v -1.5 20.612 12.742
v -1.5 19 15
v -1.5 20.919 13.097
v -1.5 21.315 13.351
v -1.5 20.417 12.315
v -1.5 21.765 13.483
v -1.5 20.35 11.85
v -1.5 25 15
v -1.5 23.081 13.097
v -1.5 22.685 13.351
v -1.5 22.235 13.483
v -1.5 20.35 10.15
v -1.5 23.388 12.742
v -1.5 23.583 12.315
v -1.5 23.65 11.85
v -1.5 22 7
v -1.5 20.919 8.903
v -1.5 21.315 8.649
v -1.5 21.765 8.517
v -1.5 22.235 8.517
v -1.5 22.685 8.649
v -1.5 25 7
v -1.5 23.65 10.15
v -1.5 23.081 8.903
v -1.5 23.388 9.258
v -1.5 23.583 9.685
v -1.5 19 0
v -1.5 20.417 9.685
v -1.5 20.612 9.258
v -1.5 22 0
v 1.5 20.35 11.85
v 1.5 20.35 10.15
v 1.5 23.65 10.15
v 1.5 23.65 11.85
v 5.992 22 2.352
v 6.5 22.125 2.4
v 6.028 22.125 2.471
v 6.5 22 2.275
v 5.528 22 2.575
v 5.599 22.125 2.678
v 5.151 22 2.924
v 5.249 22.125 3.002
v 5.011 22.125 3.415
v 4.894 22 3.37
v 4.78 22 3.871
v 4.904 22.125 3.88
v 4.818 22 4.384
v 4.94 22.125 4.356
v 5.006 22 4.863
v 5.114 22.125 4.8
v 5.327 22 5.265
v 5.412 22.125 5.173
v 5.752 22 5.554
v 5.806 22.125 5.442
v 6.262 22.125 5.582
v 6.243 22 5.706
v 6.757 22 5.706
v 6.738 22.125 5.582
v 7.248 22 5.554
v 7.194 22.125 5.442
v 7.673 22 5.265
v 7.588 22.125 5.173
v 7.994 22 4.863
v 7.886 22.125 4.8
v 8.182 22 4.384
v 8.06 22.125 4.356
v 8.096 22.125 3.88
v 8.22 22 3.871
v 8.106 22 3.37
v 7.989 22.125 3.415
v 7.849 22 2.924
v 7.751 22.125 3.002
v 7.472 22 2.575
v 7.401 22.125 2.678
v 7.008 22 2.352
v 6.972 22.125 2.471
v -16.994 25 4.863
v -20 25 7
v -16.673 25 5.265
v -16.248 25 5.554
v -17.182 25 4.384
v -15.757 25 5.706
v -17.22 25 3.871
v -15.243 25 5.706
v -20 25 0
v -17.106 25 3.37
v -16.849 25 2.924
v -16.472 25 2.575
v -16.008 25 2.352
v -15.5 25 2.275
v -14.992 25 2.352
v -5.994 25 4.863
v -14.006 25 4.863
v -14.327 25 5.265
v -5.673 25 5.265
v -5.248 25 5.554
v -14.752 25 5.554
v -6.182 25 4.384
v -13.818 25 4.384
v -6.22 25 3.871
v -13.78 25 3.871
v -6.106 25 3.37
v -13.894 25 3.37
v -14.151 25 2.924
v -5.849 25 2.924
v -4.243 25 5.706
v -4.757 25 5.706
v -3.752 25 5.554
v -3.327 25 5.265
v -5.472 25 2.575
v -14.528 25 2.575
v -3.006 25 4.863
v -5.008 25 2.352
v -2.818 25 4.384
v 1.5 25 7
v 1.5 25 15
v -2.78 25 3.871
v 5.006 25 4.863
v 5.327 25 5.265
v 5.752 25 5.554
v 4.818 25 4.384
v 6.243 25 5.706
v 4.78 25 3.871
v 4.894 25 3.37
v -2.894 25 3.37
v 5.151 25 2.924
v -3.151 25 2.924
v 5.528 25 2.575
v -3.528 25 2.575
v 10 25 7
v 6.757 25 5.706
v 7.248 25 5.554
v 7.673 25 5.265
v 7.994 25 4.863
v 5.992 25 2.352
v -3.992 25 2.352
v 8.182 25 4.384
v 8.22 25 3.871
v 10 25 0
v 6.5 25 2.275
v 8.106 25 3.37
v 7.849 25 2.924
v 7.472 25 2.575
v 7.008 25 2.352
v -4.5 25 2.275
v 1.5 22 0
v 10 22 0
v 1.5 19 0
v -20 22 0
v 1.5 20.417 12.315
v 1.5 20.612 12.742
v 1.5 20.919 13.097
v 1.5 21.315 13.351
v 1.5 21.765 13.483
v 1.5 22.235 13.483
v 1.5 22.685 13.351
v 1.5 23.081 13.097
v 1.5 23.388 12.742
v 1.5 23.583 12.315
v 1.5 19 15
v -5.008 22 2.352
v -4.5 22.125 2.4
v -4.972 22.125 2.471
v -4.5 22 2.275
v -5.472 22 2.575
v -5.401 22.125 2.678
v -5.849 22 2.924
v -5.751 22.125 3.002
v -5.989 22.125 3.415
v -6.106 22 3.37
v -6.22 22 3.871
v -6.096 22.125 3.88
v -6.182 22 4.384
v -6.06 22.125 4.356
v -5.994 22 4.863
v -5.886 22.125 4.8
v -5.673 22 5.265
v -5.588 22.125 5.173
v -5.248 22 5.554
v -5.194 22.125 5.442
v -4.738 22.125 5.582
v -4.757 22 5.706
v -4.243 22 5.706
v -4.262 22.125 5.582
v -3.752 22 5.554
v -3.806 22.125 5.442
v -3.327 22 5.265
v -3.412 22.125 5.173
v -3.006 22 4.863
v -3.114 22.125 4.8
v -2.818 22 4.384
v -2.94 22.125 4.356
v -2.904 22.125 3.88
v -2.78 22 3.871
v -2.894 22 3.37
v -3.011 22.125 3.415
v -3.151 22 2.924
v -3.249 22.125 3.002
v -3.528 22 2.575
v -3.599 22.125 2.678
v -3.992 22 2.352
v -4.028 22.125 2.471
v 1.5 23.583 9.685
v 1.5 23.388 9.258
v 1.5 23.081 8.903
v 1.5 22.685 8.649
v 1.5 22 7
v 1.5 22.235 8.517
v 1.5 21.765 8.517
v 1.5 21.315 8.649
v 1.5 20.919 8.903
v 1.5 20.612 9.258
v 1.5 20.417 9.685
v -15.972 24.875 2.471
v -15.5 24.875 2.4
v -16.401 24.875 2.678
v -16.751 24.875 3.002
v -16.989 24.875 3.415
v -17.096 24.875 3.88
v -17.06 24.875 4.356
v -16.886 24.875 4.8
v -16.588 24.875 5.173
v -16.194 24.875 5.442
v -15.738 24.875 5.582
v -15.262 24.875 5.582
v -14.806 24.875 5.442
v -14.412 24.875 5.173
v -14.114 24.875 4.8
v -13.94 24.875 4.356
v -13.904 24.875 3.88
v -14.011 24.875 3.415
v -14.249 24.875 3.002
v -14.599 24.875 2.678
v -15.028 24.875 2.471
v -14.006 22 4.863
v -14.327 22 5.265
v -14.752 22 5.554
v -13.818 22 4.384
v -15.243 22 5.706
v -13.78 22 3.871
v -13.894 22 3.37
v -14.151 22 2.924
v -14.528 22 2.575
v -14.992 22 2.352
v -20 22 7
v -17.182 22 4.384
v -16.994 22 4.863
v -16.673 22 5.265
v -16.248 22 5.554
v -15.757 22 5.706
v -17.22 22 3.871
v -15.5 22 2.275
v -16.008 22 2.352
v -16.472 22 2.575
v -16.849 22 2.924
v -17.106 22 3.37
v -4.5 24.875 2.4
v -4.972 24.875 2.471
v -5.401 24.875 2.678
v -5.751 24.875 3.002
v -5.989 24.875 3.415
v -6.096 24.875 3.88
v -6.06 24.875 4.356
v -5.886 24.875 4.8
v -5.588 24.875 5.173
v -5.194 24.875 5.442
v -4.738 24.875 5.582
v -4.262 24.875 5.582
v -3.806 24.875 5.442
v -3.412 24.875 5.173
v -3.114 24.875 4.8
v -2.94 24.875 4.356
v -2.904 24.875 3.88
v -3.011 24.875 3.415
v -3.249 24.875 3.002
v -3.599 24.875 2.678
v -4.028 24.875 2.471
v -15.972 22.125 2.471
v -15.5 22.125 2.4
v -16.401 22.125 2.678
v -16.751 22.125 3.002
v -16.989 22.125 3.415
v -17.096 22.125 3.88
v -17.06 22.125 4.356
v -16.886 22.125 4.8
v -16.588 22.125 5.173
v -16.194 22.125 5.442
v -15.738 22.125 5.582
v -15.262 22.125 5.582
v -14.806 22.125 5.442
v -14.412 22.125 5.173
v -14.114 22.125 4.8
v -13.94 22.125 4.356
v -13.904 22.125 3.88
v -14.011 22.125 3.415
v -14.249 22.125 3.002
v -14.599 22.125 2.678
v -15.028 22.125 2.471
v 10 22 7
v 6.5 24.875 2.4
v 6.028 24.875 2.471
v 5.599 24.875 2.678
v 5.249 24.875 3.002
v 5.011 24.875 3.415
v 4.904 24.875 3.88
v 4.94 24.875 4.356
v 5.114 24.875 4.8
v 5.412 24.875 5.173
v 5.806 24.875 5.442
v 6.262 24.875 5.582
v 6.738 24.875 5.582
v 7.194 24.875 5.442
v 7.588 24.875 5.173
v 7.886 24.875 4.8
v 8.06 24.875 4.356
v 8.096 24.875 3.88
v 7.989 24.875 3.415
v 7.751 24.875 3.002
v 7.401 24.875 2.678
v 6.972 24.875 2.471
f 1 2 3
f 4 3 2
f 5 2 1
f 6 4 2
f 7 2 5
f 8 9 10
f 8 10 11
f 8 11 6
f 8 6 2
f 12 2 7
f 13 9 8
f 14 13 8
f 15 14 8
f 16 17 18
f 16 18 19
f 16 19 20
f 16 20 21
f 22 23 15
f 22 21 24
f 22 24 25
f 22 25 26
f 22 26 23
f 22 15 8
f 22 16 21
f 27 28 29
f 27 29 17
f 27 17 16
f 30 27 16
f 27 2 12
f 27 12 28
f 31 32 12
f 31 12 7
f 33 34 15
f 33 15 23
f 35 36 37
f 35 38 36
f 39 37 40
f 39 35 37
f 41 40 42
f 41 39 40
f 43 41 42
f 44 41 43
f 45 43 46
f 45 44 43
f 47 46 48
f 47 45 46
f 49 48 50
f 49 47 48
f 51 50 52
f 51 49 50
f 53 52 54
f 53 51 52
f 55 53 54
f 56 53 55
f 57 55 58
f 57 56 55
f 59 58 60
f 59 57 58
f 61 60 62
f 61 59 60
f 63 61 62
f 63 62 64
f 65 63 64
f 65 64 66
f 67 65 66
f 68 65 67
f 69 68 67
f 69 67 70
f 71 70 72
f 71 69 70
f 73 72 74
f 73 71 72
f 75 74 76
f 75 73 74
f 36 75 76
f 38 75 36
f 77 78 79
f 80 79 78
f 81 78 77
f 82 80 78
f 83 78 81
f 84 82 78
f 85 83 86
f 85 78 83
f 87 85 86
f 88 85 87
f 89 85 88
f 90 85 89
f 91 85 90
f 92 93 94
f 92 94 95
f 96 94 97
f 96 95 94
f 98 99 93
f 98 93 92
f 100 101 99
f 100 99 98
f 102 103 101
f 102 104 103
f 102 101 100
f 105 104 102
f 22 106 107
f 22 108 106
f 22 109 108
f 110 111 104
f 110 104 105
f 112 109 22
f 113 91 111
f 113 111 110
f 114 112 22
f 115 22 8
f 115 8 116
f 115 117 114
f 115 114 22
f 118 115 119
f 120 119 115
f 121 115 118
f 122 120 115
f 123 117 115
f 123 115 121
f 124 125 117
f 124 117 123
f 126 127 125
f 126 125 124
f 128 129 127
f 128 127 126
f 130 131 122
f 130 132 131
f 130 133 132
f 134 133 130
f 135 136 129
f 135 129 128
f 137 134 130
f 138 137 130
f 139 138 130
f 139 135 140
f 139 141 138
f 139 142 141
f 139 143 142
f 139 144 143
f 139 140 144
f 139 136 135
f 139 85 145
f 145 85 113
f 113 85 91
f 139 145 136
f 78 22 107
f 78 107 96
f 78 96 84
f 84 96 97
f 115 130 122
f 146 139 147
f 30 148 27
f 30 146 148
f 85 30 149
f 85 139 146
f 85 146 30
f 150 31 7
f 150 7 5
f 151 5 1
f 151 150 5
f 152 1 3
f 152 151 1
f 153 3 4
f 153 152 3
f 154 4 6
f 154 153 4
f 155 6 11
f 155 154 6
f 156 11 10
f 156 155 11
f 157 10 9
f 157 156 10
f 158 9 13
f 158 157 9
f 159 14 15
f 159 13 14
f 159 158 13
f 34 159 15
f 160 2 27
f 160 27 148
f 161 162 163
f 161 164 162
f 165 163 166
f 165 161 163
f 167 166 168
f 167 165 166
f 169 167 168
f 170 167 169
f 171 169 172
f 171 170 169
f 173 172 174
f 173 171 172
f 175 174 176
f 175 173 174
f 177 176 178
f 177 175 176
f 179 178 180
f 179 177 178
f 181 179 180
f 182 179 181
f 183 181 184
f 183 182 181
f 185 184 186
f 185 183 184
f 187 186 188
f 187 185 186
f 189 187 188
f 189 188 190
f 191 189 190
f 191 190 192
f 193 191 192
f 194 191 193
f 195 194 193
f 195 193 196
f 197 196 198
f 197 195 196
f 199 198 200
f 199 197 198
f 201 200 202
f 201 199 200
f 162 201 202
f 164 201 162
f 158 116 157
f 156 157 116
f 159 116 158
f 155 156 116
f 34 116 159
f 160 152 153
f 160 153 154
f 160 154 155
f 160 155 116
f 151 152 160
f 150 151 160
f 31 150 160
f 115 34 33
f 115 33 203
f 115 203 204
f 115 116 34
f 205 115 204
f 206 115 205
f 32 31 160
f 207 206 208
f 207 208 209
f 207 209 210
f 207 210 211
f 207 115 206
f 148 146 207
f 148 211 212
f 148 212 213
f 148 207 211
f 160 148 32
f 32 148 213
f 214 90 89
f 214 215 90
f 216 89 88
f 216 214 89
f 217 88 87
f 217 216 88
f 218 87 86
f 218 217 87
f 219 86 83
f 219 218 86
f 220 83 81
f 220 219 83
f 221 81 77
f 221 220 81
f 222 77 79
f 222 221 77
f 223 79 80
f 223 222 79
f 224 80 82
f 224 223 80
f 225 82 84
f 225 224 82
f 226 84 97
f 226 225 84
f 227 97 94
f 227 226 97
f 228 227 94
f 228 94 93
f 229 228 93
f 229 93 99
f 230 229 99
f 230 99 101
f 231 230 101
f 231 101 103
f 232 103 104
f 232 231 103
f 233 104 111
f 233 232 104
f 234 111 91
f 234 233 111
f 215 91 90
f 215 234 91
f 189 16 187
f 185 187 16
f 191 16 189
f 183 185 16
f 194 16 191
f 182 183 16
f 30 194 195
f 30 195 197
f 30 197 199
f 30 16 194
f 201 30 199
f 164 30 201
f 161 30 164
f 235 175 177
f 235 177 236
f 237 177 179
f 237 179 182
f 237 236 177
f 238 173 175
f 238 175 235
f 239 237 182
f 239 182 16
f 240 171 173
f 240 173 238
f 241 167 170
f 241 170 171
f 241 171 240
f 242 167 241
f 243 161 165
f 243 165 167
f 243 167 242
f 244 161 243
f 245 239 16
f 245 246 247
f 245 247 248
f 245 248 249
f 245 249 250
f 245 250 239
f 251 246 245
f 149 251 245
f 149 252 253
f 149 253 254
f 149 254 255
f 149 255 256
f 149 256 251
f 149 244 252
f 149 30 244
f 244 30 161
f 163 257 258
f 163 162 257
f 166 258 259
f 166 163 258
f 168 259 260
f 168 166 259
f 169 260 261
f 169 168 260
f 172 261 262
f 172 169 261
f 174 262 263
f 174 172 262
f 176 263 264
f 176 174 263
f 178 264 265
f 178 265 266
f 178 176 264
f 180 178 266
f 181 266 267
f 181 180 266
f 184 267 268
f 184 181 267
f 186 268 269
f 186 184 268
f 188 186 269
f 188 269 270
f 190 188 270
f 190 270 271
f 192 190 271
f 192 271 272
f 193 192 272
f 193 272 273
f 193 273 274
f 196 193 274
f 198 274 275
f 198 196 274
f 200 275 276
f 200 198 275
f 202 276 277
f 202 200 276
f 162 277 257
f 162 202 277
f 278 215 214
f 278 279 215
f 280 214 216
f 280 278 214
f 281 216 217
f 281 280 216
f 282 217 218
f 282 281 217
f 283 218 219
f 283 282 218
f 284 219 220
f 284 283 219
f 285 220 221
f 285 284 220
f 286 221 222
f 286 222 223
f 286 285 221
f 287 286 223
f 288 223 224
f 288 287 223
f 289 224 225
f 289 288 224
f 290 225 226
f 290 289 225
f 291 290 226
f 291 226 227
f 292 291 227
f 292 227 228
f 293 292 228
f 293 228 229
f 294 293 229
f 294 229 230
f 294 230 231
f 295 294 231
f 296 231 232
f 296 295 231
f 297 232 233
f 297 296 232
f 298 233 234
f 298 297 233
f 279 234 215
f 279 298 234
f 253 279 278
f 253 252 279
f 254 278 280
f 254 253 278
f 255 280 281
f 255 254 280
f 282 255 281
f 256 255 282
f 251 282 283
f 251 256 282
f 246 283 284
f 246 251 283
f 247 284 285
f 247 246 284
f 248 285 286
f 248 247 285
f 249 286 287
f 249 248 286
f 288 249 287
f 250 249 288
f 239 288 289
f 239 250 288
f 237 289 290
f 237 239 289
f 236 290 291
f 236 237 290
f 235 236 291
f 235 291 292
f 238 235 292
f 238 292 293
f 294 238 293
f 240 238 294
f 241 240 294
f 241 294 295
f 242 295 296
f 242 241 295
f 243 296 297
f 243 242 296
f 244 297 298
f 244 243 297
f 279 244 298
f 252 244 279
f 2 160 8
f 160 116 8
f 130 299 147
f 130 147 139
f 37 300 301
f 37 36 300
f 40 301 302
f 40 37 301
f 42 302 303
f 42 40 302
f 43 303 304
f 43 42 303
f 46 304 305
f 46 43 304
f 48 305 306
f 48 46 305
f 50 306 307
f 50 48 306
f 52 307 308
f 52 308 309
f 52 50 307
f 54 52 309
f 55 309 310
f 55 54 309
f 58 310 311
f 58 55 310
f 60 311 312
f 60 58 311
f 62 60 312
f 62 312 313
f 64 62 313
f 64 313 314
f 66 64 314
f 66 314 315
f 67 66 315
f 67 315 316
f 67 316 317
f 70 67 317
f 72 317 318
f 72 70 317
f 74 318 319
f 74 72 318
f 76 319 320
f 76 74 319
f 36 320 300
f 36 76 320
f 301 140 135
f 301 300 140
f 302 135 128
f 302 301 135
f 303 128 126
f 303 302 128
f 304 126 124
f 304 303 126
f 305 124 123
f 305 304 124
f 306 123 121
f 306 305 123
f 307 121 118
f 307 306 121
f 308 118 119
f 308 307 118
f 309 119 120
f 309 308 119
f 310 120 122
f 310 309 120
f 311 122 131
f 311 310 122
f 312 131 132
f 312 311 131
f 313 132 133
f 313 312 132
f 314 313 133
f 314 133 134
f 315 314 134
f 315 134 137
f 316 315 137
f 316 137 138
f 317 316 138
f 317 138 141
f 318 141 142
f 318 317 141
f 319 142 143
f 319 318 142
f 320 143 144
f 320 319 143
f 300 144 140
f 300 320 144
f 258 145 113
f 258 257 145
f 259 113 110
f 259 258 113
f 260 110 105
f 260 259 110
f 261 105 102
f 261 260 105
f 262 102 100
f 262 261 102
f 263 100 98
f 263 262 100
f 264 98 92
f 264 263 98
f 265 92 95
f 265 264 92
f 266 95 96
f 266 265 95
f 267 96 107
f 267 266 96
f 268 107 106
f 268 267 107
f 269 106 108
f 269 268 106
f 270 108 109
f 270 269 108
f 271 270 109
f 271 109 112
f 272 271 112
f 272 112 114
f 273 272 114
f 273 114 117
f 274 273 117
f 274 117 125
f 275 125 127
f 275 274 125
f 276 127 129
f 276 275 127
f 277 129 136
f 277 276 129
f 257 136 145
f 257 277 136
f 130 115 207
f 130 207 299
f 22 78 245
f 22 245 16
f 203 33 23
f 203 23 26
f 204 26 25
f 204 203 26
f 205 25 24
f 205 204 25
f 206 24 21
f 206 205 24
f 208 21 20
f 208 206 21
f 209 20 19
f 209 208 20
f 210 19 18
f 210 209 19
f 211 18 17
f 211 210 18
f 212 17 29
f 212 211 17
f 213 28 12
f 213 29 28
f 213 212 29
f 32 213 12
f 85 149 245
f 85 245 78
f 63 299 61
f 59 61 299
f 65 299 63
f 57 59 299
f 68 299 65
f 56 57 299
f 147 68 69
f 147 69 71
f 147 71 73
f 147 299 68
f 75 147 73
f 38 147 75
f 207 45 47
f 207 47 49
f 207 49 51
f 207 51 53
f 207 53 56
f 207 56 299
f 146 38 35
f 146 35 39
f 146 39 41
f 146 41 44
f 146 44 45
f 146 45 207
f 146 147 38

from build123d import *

# Parameters (mm, degrees)
EXTRUDE_1_DEPTH            = 15
SKETCH_2_W                 = 3
SKETCH_2_H                 = 19
SKETCH_2_W_2               = 10
SKETCH_2_H_2               = 3
CUT_EXTRUDE_1_DEPTH        = 16
SKETCH_3_W                 = 18.5
SKETCH_3_H                 = 3
SKETCH_3_W_2               = 8.5
CUT_EXTRUDE_3_DEPTH        = 8
HOLE_WIZARD_M31_AT_2_COUNT = 2
HOLE_WIZARD_M31_AT_2_PITCH = 22
HOLE_WIZARD_M31_AT_3_COUNT = 2
HOLE_WIZARD_M31_AT_3_PITCH = 11
CUT_EXTRUDE_4_REACH        = 23.5


with BuildPart() as part:
    # Эскиз1 → Бобышка-Вытянуть1 (new body)
    with BuildSketch(Plane.XY):
        Polygon((-1.5, 0), (-1.5, 22), (-20, 22), (-20, 25), (20, 25), (20, 22), (1.5, 22), (1.5, 0), align=None)
    extrude(amount=EXTRUDE_1_DEPTH)

    # Эскиз2 → Вырез-Вытянуть1 (cut, through all)
    with BuildSketch(Plane.XY.offset(15)):
        with Locations((0, 9.5)):
            Rectangle(SKETCH_2_W, SKETCH_2_H)
        with Locations((15, 23.5)):
            Rectangle(SKETCH_2_W_2, SKETCH_2_H_2)
    extrude(amount=-CUT_EXTRUDE_1_DEPTH, mode=Mode.SUBTRACT)

    # Эскиз3 → Вырез-Вытянуть3 (cut)
    with BuildSketch(Plane.XY.offset(15)):
        with Locations((-10.75, 23.5)):
            Rectangle(SKETCH_3_W, SKETCH_3_H)
        with Locations((5.75, 23.5)):
            Rectangle(SKETCH_3_W_2, SKETCH_3_H)
    extrude(amount=-CUT_EXTRUDE_3_DEPTH, mode=Mode.SUBTRACT)

    # Эскиз4 → Отверстие с зазором M31 (revolve, cut)
    with BuildSketch(Plane(origin=(-15.5, 22, 4), x_dir=(0, 0, -1), z_dir=(1, 0, 0))):
        Polygon((0, 0), (0, 3), (1.725, 3), (1.6, 2.875), (1.6, 0.125), (1.725, 0), align=None)
    hole_wizard_m31 = revolve(axis=Axis((-15.5, 15.65, 4), (0, 1, 0)), mode=Mode.SUBTRACT)

    # Отверстие с зазором M31 at 2: Отверстие с зазором M31 ×2
    with Locations(*[(i * HOLE_WIZARD_M31_AT_2_PITCH, 0, 0) for i in range(1, HOLE_WIZARD_M31_AT_2_COUNT)]):
        add(hole_wizard_m31, mode=Mode.SUBTRACT)

    # Отверстие с зазором M31 at 3: Отверстие с зазором M31 ×2
    with Locations(*[(i * HOLE_WIZARD_M31_AT_3_PITCH, 0, 0) for i in range(1, HOLE_WIZARD_M31_AT_3_COUNT)]):
        add(hole_wizard_m31, mode=Mode.SUBTRACT)

    # Эскиз6 → Вырез-Вытянуть4 (cut, up to next)
    with BuildSketch(Plane(origin=(1.5, 0, 0), x_dir=(0, 0, -1), z_dir=(1, 0, 0)), mode=Mode.PRIVATE) as cut_extrude_4_sk1:
        with BuildLine():
            Line((-11.85, 23.65), (-10.15, 23.65))
            ThreePointArc((-10.15, 23.65), (-8.5, 22), (-10.15, 20.35))
            Line((-10.15, 20.35), (-11.85, 20.35))
            ThreePointArc((-11.85, 20.35), (-13.5, 22), (-11.85, 23.65))
        make_face()
    cut_extrude_4_tool1 = extrude(cut_extrude_4_sk1.sketch, amount=-CUT_EXTRUDE_4_REACH, mode=Mode.PRIVATE) & part.part
    add(cut_extrude_4_tool1.solids().sort_by_distance((1.5, 22, 11))[0], mode=Mode.SUBTRACT)


solid = part.part
